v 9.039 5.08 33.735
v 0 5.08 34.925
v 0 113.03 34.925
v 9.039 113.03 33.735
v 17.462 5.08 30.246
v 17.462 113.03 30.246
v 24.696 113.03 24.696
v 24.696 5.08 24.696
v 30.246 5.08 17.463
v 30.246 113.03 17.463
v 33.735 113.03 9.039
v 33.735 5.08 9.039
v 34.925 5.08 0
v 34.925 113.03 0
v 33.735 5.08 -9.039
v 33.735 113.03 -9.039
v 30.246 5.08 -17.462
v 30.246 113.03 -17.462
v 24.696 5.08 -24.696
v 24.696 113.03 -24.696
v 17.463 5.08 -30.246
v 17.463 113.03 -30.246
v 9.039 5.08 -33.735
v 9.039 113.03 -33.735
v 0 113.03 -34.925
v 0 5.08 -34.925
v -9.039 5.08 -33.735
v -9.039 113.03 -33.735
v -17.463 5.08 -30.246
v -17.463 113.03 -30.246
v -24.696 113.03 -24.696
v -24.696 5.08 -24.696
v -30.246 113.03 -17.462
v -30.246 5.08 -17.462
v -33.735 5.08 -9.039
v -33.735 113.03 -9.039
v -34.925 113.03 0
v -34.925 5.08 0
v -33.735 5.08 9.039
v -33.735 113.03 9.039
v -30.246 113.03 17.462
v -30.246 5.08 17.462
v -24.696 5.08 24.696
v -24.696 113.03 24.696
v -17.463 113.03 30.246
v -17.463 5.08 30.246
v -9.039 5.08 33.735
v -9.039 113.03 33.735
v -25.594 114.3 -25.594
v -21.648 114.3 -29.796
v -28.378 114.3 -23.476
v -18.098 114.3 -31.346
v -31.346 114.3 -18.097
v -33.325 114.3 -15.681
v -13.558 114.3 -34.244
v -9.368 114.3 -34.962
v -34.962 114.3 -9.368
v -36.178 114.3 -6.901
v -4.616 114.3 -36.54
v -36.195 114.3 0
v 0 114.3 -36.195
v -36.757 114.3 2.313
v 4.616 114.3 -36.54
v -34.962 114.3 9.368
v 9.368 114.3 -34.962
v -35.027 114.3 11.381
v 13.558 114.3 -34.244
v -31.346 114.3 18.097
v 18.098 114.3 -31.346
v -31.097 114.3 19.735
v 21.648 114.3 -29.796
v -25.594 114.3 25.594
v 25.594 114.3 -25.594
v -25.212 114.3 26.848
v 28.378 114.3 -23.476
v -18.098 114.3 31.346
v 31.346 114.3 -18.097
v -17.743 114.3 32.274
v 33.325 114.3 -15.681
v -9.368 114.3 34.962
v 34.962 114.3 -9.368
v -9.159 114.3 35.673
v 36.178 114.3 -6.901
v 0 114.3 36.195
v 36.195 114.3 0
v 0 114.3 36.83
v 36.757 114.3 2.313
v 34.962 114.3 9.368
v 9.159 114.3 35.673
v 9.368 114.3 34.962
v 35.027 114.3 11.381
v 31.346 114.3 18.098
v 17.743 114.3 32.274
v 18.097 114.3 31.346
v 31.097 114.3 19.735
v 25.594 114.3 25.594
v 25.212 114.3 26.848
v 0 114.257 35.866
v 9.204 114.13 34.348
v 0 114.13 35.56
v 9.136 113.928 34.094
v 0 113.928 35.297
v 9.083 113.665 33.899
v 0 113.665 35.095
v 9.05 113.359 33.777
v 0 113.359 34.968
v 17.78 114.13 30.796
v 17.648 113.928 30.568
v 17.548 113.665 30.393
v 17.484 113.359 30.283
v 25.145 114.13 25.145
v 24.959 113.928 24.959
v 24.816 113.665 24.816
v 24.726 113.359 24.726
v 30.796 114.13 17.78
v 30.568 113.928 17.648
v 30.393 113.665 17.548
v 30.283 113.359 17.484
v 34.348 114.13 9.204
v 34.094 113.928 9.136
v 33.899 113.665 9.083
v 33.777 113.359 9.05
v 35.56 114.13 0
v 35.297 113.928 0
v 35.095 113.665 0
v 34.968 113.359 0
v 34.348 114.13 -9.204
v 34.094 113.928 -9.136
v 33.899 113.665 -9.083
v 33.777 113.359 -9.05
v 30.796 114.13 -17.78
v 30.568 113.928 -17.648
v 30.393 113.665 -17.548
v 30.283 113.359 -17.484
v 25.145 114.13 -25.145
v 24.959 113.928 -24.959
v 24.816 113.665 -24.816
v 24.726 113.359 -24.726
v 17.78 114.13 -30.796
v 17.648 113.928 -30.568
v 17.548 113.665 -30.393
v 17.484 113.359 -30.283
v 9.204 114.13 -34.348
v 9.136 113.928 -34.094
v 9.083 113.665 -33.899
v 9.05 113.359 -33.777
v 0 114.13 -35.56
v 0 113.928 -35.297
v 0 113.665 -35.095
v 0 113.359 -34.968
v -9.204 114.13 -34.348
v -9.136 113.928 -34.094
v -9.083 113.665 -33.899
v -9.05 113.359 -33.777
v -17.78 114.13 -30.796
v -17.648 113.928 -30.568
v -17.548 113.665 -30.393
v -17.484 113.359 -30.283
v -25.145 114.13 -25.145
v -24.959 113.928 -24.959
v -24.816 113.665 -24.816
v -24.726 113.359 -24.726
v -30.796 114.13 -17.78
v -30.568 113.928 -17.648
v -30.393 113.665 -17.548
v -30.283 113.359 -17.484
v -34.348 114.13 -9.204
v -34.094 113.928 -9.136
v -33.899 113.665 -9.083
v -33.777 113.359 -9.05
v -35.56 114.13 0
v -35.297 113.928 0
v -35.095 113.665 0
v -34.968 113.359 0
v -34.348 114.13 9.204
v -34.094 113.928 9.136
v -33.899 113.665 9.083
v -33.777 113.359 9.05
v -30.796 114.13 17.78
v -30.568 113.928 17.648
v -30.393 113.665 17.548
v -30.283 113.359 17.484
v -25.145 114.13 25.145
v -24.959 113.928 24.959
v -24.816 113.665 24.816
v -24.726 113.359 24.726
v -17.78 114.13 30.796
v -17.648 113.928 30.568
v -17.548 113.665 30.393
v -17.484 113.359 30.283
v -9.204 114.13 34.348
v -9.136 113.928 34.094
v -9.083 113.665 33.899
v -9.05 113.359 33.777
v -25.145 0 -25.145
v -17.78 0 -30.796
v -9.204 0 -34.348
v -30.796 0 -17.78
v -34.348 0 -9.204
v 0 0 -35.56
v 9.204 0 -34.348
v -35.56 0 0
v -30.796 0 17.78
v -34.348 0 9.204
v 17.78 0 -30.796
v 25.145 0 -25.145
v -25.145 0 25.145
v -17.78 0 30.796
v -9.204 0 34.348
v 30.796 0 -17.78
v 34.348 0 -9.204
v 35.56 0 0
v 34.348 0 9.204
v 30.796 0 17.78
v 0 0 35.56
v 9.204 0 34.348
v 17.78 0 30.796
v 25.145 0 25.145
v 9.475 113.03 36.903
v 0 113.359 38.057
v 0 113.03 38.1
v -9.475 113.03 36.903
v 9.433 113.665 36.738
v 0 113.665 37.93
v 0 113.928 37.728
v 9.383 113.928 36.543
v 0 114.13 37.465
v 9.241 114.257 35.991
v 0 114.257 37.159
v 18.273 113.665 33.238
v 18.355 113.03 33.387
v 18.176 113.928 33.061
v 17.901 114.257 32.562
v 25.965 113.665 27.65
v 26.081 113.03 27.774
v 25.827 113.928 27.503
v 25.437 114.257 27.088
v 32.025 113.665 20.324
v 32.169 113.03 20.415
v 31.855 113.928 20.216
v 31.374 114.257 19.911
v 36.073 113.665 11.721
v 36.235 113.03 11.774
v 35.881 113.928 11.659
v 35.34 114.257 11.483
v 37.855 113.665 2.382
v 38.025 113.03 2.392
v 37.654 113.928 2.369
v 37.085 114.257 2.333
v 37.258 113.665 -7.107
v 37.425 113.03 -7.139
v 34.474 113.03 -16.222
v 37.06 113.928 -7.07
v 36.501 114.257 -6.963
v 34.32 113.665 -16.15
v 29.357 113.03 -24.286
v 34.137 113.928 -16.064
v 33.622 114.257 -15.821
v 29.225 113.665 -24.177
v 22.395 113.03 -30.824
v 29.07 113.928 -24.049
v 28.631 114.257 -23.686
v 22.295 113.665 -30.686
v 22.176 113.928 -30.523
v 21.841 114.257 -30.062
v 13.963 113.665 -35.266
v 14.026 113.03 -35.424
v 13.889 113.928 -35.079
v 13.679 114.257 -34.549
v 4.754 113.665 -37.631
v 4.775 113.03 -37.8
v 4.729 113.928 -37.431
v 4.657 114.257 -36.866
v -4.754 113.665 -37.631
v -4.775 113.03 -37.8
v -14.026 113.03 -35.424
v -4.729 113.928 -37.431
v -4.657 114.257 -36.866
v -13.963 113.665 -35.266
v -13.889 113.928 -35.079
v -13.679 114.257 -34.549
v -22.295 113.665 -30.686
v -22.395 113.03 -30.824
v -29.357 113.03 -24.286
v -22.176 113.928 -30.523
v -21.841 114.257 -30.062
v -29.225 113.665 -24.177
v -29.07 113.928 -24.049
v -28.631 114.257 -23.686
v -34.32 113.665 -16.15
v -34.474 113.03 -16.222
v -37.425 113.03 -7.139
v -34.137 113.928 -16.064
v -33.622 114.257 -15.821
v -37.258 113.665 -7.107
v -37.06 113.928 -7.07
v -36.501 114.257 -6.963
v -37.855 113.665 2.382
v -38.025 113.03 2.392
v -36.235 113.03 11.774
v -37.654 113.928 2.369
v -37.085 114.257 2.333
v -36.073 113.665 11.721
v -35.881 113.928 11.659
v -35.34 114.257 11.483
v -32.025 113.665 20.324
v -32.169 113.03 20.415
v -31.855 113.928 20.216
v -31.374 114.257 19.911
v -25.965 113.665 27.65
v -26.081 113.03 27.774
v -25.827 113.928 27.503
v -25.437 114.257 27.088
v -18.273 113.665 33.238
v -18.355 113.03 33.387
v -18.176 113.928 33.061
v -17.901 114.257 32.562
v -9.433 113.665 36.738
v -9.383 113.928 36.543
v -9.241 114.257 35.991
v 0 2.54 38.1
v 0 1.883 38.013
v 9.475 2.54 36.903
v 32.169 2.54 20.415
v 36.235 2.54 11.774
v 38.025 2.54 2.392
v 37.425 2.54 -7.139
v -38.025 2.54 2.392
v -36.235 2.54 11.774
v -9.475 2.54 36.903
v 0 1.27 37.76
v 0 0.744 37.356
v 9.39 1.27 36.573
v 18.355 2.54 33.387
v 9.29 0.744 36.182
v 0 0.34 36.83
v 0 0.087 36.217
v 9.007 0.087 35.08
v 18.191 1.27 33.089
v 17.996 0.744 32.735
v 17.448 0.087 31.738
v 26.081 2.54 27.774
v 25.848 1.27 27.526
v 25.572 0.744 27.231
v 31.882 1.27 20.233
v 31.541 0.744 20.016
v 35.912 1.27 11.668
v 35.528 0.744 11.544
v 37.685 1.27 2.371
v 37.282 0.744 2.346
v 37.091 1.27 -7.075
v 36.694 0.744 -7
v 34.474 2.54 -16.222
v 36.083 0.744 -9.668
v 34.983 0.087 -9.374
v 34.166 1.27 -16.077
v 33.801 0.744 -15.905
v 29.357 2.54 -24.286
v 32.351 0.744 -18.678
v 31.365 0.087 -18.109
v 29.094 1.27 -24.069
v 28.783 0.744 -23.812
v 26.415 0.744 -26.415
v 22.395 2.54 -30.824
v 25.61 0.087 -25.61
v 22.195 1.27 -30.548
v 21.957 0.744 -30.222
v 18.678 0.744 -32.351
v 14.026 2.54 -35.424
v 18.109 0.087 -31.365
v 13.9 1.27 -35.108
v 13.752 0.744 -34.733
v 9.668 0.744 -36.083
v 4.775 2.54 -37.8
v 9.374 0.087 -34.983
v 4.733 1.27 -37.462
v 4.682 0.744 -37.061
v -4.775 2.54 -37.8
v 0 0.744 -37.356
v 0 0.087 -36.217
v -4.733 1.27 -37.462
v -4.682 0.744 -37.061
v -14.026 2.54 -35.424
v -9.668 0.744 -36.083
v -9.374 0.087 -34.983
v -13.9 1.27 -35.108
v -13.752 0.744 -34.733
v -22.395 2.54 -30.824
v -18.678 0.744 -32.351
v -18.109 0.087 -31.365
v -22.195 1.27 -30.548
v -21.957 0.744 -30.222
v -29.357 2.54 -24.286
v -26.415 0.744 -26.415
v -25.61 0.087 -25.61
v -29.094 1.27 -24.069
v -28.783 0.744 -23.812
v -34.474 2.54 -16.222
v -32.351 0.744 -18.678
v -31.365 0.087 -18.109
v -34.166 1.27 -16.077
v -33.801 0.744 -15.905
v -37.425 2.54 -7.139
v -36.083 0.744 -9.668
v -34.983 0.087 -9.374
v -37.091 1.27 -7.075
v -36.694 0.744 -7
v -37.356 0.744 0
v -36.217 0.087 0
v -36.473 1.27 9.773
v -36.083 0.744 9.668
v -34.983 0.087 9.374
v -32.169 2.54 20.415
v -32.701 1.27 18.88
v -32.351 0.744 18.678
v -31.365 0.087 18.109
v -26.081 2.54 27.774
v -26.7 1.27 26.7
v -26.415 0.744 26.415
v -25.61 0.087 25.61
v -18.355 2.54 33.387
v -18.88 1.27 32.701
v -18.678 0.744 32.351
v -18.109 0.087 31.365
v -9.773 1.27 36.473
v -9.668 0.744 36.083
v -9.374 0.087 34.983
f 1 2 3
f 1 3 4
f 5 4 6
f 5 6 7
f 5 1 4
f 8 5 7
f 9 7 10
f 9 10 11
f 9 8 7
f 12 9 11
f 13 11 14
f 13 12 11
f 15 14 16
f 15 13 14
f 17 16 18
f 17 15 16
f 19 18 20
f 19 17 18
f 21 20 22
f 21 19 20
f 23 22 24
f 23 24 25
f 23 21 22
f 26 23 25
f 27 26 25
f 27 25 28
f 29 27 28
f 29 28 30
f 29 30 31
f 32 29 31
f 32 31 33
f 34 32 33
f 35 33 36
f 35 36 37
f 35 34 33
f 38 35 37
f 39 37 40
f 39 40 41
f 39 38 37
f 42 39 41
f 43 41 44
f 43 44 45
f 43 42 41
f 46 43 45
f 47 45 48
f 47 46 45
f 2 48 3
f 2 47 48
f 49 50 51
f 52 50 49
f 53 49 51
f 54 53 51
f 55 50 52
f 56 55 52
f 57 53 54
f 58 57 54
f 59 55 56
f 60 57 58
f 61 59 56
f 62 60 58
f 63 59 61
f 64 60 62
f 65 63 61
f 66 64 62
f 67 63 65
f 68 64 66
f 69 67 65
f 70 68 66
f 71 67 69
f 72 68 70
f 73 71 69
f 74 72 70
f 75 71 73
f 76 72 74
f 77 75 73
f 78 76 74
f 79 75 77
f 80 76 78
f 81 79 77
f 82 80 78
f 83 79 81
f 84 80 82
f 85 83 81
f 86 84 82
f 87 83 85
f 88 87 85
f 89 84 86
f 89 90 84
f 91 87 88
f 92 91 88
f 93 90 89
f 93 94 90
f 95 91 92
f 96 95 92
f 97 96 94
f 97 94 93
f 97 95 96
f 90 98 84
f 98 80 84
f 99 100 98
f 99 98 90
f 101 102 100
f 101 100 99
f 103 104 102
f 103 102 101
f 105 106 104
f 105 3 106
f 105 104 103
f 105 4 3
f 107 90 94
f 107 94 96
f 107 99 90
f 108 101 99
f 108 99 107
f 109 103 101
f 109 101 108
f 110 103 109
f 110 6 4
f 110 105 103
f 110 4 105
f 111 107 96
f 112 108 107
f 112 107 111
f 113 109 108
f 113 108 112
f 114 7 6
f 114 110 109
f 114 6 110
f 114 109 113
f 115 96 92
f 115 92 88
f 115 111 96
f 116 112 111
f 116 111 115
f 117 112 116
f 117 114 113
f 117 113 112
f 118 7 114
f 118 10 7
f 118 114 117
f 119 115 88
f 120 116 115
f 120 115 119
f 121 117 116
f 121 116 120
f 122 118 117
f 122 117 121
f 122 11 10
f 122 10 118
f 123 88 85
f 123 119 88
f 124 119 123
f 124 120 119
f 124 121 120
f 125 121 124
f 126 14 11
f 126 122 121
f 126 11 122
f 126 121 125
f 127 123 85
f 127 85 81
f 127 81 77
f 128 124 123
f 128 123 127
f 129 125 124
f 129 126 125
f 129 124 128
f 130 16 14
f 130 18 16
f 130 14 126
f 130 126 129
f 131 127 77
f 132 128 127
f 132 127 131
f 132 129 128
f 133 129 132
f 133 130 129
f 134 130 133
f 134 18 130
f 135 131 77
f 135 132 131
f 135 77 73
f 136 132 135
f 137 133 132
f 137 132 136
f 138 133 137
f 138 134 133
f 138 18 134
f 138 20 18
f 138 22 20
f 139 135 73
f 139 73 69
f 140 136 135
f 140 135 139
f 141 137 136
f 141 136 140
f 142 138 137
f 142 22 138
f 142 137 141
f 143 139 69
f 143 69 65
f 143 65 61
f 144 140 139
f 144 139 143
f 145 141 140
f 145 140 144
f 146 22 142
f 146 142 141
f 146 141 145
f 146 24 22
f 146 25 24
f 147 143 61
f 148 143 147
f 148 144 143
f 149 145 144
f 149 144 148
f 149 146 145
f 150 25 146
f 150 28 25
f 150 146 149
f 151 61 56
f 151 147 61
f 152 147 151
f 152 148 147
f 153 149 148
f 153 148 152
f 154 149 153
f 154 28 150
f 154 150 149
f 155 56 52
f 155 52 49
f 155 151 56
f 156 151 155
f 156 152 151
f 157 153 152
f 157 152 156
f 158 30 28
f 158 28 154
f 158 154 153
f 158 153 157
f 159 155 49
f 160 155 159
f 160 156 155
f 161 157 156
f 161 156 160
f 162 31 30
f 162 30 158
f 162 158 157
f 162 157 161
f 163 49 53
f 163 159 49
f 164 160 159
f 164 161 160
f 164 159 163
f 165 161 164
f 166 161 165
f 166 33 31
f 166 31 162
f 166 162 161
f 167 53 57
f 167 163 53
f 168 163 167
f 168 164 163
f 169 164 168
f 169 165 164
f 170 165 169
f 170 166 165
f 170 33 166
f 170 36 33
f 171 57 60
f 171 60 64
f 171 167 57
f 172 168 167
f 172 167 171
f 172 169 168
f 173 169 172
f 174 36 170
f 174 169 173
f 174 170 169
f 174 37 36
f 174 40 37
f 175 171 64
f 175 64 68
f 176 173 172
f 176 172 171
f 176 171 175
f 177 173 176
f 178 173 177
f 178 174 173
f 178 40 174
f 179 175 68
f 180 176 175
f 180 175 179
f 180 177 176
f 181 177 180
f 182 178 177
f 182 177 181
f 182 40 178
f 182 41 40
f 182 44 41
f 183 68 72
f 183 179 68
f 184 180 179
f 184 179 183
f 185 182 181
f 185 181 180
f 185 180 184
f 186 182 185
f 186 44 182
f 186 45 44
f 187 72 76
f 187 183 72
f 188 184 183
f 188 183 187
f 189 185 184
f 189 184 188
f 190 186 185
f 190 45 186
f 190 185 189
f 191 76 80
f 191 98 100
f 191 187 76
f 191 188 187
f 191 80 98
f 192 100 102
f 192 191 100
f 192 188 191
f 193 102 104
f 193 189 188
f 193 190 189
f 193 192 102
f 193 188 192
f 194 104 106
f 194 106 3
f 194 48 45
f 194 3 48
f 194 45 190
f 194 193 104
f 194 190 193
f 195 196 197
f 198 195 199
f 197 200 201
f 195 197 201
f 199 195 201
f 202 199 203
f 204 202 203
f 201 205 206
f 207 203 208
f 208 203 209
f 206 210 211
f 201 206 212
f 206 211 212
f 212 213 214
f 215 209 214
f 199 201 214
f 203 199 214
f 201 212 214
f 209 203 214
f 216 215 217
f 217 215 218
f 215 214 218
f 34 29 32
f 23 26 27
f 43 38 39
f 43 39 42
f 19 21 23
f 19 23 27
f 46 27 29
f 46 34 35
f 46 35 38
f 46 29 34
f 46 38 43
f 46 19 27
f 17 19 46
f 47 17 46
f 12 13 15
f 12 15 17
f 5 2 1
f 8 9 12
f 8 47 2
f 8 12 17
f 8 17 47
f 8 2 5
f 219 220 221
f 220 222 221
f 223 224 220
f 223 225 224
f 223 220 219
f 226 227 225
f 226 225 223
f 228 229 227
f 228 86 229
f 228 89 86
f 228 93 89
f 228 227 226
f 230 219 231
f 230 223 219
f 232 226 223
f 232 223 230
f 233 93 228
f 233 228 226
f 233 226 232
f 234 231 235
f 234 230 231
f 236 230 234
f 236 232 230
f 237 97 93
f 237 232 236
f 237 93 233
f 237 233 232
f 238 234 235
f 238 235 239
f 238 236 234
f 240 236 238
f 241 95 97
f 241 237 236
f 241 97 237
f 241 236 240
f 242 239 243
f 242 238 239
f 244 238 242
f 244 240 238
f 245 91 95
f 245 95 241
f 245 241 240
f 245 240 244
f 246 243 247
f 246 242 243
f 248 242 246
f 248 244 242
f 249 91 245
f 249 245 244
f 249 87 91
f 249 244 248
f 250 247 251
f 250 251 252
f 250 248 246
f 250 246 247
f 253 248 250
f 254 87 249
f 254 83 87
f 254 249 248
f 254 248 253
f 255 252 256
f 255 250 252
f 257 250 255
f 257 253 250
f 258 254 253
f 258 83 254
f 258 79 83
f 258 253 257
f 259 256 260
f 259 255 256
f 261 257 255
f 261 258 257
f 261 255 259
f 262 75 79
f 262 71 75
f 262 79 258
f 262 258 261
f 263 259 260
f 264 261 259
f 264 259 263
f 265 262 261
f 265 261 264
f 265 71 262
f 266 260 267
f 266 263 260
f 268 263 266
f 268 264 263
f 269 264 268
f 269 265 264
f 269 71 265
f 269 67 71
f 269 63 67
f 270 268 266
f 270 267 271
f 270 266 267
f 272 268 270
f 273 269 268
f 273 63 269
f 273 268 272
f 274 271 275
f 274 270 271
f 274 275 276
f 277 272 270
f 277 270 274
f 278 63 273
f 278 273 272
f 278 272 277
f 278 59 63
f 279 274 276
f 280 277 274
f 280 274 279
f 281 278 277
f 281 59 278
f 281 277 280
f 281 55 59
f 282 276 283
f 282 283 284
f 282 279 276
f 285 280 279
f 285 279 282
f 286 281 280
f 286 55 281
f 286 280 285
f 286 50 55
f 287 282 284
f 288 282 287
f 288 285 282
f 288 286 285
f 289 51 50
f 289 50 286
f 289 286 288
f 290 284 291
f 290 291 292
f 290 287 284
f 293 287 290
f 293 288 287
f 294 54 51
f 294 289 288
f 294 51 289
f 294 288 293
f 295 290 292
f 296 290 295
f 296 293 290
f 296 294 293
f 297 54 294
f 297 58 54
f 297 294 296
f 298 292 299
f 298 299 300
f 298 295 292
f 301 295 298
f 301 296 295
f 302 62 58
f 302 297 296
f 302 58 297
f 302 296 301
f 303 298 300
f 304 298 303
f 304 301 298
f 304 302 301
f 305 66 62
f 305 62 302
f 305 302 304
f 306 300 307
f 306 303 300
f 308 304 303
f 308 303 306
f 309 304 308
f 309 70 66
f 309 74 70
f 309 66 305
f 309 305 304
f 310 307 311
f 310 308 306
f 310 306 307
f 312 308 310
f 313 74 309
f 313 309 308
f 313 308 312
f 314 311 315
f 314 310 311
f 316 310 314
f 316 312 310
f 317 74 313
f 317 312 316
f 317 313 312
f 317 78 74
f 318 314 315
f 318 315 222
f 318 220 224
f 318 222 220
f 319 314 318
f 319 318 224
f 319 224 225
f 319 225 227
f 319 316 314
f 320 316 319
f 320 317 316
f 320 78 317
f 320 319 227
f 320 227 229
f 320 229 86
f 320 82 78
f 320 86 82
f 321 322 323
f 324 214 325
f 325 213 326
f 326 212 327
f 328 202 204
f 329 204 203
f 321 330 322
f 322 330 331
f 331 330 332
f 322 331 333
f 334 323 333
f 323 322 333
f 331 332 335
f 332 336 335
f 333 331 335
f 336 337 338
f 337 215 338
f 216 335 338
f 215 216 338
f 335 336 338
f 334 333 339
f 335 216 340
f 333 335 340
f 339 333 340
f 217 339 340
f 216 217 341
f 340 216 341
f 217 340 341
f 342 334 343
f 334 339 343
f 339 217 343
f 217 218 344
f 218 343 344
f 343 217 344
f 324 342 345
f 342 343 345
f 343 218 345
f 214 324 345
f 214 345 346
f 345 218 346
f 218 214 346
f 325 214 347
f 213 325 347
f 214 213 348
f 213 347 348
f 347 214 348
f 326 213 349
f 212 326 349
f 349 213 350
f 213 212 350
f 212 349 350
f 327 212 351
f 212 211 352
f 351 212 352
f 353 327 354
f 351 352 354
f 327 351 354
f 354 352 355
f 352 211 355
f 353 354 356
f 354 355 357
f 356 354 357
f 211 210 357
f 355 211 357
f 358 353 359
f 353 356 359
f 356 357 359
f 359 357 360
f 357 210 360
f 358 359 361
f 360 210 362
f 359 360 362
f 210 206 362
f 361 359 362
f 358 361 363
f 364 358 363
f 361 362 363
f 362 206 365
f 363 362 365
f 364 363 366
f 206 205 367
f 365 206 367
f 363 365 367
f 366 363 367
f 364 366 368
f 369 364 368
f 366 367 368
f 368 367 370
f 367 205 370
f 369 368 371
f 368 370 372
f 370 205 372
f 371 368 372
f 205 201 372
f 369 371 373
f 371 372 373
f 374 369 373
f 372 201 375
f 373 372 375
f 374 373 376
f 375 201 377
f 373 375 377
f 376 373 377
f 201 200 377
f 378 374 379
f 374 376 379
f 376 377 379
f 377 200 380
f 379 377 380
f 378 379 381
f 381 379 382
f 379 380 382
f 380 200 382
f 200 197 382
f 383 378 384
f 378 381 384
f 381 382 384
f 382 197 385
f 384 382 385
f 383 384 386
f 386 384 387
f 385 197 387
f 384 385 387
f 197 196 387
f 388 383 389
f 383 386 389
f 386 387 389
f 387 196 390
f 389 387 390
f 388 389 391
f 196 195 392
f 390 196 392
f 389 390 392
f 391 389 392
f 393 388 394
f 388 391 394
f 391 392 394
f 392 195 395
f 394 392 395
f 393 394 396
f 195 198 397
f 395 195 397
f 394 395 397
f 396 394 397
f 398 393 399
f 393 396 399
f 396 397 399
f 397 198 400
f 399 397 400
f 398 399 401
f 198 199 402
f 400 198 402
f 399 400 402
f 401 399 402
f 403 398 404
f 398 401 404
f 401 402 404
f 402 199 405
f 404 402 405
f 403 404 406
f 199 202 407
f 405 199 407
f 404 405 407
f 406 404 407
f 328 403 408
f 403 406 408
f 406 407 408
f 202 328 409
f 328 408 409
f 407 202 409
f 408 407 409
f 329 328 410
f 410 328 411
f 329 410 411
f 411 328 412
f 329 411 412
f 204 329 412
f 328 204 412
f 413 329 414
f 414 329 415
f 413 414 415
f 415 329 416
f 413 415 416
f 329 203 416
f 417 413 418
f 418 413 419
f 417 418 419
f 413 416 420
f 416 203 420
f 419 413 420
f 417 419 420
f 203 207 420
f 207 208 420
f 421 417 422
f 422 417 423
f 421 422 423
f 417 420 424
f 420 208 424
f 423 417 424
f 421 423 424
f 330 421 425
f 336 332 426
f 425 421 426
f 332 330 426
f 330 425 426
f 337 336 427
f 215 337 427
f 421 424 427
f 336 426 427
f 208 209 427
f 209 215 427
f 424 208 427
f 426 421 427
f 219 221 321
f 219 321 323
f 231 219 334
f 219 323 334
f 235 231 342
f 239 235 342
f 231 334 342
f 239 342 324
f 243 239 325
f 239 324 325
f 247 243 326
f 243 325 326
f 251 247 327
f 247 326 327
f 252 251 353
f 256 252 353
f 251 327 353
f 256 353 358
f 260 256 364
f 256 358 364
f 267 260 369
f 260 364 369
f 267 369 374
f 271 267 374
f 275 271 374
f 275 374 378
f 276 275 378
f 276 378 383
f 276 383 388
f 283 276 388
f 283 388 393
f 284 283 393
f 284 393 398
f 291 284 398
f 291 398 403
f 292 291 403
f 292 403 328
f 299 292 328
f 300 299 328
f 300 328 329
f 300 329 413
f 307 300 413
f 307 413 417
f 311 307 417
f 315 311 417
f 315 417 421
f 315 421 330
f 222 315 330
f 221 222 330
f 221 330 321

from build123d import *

# Parameters (mm, degrees)
SKETCH1_R           = 38.1
BOSS_EXTRUDE1_DEPTH = 5.08
SKETCH3_R           = 38.1
SKETCH3_R_2         = 34.925
BOSS_EXTRUDE2_DEPTH = 109.22
FILLET1_R           = 1.27
FILLET2_R           = 2.54


with BuildPart() as part:
    # Sketch1 → Boss-Extrude1 (new body)
    with BuildSketch(Plane(origin=(0, 0, 0), x_dir=(1, 0, 0), z_dir=(0, 1, 0))):
        with Locations(Location((0, 0, 0), (0, 0, 270))):
            Circle(SKETCH1_R)
    extrude(amount=BOSS_EXTRUDE1_DEPTH)

    # Sketch3 → Boss-Extrude2 (add)
    with BuildSketch(Plane(origin=(0, 5.08, 0), x_dir=(1, 0, 0), z_dir=(0, 1, 0))):
        with Locations(Location((0, 0, 0), (0, 0, 270))):
            Circle(SKETCH3_R)
        with Locations(Location((0, 0, 0), (0, 0, 270))):
            Circle(SKETCH3_R_2, mode=Mode.SUBTRACT)
    extrude(amount=BOSS_EXTRUDE2_DEPTH)

    # Fillet1
    fillet1_edges = [part.edges().sort_by_distance(p)[0] for p in [
        (0, 114.3, -38.1),
        (0, 114.3, -34.925),
    ]]
    fillet(fillet1_edges, radius=FILLET1_R)

    # Fillet2
    fillet2_edges = [part.edges().sort_by_distance(p)[0] for p in [
        (0, 0, -38.1),
    ]]
    fillet(fillet2_edges, radius=FILLET2_R)


solid = part.part
